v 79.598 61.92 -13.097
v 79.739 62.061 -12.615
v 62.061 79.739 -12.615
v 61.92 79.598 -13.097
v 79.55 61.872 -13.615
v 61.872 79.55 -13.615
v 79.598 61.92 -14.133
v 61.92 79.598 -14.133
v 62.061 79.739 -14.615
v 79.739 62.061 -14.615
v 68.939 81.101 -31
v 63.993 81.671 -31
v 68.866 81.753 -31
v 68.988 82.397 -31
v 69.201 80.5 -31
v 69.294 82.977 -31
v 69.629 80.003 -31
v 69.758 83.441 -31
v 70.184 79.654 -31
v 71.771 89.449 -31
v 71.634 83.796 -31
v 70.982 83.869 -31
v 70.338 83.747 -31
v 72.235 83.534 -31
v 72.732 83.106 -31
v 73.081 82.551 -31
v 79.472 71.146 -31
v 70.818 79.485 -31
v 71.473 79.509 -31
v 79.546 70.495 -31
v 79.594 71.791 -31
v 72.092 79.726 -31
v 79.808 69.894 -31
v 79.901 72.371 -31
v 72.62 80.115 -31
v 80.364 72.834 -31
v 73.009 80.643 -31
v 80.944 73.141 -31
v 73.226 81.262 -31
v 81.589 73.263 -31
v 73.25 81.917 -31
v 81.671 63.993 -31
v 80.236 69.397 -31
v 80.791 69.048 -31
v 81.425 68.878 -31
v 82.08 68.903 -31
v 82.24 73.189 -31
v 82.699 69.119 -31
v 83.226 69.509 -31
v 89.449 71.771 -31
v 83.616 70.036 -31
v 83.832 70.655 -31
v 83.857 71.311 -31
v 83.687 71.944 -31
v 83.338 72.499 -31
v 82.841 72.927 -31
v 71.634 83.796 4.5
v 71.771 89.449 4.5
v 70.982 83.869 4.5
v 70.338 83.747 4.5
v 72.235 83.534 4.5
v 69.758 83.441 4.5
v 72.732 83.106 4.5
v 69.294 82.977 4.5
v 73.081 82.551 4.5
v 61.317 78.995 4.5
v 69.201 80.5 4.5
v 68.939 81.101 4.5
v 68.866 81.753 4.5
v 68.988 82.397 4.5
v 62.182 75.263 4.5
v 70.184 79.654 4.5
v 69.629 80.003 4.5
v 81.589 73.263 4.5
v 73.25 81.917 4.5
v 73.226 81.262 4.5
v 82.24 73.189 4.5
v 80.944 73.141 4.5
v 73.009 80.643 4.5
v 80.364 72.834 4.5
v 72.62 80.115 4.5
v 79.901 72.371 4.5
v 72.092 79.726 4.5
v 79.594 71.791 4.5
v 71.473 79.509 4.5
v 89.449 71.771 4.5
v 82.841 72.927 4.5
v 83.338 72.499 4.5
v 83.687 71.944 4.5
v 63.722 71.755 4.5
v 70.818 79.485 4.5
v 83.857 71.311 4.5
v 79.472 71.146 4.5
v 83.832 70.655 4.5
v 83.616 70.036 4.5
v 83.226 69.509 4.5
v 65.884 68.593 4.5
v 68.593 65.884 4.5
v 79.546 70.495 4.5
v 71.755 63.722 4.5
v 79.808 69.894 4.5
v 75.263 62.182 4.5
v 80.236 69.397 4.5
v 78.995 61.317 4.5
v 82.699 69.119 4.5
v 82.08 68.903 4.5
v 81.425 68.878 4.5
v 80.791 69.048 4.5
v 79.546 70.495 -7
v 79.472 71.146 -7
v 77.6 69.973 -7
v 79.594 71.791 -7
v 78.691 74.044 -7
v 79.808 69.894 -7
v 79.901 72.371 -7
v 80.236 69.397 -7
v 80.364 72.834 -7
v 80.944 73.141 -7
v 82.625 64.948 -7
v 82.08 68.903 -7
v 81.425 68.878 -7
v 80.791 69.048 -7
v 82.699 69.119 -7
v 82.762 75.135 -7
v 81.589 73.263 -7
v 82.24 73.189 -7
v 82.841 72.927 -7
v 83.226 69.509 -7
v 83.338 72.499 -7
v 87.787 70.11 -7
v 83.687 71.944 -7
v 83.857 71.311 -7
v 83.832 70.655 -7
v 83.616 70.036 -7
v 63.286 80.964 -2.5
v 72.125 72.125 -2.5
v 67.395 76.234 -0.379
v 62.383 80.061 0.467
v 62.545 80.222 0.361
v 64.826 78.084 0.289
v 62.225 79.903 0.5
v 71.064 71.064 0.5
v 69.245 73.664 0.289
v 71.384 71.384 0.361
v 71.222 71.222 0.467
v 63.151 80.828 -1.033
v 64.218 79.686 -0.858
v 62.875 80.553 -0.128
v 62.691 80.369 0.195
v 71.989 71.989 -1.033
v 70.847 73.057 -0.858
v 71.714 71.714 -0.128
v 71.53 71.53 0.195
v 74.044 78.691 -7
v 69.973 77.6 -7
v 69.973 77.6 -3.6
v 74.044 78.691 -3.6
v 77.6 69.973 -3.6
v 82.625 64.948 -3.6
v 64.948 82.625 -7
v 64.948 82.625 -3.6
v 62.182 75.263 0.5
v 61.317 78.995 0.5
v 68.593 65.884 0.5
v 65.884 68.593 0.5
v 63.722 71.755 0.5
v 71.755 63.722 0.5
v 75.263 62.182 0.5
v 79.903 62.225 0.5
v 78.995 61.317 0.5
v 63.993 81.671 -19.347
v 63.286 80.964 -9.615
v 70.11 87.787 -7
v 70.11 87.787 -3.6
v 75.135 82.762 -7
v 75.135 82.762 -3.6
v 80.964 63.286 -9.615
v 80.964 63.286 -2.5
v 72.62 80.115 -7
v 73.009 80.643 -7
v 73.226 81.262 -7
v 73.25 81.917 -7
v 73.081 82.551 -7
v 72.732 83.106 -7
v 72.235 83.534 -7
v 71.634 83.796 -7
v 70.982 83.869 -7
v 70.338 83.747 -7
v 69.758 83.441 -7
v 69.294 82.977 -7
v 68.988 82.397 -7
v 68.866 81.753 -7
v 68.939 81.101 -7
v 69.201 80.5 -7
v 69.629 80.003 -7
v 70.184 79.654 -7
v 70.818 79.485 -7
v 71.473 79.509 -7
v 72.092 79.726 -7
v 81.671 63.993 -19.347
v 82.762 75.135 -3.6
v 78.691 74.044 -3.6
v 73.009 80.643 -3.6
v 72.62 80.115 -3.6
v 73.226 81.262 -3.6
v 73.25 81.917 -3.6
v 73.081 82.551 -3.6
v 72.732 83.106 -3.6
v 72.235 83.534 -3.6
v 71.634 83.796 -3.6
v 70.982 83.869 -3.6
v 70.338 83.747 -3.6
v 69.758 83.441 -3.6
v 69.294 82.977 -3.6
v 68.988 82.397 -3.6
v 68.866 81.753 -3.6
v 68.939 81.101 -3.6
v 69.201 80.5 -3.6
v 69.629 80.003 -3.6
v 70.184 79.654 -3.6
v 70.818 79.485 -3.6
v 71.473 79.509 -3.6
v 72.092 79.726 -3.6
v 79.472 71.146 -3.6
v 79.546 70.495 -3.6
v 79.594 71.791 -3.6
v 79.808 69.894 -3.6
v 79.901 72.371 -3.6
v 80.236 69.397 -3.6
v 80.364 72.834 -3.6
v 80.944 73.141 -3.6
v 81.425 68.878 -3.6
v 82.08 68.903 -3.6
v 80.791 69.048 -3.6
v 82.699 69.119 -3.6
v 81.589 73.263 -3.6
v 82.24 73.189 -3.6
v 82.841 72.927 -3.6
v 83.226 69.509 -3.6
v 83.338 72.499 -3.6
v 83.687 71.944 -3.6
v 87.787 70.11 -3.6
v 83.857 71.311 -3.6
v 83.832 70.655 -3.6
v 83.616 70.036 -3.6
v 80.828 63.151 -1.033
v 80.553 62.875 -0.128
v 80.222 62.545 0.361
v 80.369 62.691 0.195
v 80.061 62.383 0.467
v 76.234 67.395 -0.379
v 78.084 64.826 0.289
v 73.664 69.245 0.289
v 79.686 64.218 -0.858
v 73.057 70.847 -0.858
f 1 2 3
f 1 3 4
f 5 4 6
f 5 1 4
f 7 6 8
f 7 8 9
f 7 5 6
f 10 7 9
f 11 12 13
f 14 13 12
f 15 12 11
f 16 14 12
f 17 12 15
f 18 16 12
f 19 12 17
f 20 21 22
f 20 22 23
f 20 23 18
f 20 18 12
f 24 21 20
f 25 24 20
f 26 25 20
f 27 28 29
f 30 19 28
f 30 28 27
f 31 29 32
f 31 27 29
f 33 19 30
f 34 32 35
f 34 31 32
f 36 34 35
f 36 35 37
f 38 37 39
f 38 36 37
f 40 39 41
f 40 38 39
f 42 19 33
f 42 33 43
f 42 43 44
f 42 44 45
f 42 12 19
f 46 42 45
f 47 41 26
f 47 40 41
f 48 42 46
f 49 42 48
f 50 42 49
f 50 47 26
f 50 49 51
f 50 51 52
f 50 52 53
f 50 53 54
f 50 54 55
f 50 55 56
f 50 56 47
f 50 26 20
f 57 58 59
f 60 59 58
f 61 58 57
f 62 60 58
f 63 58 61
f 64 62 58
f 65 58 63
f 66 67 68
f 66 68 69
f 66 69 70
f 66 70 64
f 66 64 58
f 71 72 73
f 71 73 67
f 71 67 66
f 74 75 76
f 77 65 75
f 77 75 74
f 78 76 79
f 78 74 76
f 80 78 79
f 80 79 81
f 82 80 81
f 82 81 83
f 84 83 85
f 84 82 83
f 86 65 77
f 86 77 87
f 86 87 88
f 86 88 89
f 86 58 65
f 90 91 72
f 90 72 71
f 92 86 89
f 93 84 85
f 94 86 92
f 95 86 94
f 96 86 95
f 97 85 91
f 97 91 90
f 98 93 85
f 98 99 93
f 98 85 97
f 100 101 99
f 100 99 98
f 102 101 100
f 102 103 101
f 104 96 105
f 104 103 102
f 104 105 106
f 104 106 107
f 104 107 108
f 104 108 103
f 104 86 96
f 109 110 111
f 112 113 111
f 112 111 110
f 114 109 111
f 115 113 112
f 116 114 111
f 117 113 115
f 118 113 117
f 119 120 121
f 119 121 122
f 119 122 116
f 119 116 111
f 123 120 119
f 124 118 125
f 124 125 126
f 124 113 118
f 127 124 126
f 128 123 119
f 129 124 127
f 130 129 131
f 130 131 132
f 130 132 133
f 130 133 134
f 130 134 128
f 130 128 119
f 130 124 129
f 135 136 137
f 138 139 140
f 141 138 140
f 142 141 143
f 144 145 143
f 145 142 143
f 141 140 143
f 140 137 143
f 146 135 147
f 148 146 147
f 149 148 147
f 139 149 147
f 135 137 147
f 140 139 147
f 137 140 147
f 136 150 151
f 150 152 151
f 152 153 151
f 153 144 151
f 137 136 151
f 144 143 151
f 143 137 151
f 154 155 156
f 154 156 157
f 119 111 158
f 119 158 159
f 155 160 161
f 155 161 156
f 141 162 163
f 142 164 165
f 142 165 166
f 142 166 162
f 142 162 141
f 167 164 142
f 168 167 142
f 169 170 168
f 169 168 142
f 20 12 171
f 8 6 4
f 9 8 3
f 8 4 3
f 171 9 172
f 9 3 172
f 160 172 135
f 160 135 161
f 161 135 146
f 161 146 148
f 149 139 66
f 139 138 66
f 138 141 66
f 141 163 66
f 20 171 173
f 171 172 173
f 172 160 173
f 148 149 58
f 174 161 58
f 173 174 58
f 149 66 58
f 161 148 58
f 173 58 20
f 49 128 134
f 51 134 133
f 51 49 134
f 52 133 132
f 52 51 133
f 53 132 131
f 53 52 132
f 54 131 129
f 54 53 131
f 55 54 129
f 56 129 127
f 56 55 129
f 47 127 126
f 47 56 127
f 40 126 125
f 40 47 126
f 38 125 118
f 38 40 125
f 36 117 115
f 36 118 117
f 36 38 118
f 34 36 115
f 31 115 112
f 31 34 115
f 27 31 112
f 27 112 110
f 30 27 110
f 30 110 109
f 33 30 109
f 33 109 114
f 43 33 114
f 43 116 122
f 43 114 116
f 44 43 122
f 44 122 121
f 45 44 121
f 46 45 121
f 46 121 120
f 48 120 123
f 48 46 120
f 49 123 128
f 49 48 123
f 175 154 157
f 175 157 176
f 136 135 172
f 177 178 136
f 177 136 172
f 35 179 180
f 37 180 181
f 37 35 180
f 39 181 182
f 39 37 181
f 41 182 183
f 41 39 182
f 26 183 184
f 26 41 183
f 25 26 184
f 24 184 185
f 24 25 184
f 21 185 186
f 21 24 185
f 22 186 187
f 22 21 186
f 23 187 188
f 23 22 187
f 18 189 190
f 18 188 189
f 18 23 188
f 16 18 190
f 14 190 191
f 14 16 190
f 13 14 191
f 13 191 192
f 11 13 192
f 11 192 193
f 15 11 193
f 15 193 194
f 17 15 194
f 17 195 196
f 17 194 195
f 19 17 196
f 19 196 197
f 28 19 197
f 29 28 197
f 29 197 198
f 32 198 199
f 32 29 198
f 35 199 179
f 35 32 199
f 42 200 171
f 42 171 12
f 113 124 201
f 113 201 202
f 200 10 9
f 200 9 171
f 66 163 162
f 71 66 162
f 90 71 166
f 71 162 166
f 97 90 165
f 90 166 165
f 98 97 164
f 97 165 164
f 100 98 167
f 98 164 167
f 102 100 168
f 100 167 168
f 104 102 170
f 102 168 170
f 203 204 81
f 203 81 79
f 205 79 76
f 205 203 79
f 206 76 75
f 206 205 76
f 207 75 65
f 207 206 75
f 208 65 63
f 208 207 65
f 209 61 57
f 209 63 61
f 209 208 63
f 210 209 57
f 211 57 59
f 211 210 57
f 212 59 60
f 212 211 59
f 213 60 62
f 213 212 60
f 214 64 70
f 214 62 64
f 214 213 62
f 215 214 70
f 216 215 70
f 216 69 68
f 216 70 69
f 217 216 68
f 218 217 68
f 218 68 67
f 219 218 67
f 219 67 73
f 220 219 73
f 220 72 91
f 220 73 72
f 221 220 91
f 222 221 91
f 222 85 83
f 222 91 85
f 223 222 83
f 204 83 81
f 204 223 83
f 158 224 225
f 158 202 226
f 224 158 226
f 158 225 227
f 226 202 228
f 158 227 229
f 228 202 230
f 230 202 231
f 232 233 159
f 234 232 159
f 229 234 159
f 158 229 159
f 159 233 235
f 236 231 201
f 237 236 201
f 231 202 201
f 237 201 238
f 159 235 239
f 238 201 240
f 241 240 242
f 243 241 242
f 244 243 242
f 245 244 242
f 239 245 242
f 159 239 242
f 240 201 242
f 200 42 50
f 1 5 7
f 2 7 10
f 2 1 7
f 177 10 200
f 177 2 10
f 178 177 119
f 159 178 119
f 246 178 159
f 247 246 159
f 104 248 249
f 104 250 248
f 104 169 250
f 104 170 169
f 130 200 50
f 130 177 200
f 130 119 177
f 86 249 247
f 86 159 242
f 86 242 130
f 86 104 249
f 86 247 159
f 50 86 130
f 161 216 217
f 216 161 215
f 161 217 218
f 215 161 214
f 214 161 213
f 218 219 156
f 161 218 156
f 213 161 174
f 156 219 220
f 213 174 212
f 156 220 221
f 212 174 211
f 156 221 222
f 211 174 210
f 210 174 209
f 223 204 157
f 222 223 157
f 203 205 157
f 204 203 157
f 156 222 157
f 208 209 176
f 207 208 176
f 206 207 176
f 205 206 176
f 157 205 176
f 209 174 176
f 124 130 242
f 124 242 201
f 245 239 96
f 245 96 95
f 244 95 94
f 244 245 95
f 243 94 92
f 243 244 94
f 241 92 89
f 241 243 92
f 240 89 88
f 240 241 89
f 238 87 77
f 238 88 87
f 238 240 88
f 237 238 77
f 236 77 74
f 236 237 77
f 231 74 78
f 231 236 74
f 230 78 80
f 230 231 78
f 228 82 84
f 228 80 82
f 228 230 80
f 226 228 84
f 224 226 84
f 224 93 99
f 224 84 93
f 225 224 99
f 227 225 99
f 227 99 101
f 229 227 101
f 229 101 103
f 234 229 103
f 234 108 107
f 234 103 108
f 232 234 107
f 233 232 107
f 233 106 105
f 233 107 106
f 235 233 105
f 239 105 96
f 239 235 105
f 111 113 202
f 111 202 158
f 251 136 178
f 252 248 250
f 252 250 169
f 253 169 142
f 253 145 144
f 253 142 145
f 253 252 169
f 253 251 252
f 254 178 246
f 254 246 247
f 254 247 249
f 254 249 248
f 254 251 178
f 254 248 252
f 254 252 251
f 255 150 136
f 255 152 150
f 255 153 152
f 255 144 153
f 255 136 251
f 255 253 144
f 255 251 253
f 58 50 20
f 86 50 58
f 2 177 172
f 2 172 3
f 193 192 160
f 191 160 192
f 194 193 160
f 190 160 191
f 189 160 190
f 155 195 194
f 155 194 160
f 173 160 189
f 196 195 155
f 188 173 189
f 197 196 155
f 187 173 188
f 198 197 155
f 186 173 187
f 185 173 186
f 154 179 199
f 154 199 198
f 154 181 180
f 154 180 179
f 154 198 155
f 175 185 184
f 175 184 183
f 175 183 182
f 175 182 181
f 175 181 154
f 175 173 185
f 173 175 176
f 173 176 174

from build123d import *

# Parameters (mm, degrees)
PAD022_DEPTH            = 12.5
SKETCH043_R             = 2.2
POCKET007_DEPTH         = 35.501
POCKET098_DEPTH         = 3.4
BODY022_PLACEMENT_ANGLE = 45


with BuildPart() as part:
    # Sketch042 → Pad022 (new body, symmetric)
    with BuildSketch(Plane.YZ):
        with BuildLine():
            Line((-1, 28.5), (-1, 21.385113))
            Line((-1, 21.385113), (-2.732051, 18.385113))
            ThreePointArc((-2.732051, 18.385113), (-3, 17.385113), (-2.732051, 16.385113))
            Line((-2.732051, 16.385113), (0, 11.653062))
            Line((0, 11.653062), (0, 0))
            Line((0, 0), (11, 0))
            Line((11, 0), (11, 35.5))
            Line((11, 35.5), (-8, 35.5))
            Line((-8, 35.5), (-8, 31.5))
            Line((-8, 31.5), (-2.5, 31.5))
            add(Edge.make_bspline(
                [(-1, 28.5), (-1, 31.5), (-2.5, 31.5)],
                knots=[4.712389, 4.712389, 4.712389, 6.283185, 6.283185, 6.283185], degree=2, weights=[1, 0.707107, 1]))
        make_face()
    extrude(amount=PAD022_DEPTH, both=True)

    # Sketch043 → Pocket007 (cut, through all)
    with BuildSketch(Plane.XY):
        with Locations((-7.5, 5)):
            Circle(SKETCH043_R)
        with Locations((7.5, 5)):
            Circle(SKETCH043_R)
        with BuildLine():
            ThreePointArc((-12.5, -3.784326), (0, -8), (12.5, -3.784326))
            Line((12.5, -3.784326), (13.5, -3.784326))
            Line((13.5, -3.784326), (13.5, -9))
            Line((-13.5, -9), (13.5, -9))
            Line((-13.5, -3.784326), (-13.5, -9))
            Line((-12.5, -3.784326), (-13.5, -3.784326))
        make_face()
    extrude(amount=POCKET007_DEPTH, mode=Mode.SUBTRACT)

    # Sketch150 → Pocket098 (cut)
    with BuildSketch(Plane.XY.offset(24)):
        Polygon((-5.392672, 1.35), (-3.285343, 5), (-5.392672, 8.65), (-13.5, 8.65), (-13.5, 1.35), align=None)
        Polygon((5.392672, 8.65), (3.285343, 5), (5.392672, 1.35), (13.5, 1.35), (13.5, 8.65), align=None)
    extrude(amount=POCKET098_DEPTH, mode=Mode.SUBTRACT)


with BuildPart() as part_1:
    # Body022 placement: moved
    add(part.part.moved(Location((72.831998, 72.831998, -31))).rotate(Axis((72.831998, 72.831998, -31), (0, 0, -1)), BODY022_PLACEMENT_ANGLE))


solid = part_1.part
